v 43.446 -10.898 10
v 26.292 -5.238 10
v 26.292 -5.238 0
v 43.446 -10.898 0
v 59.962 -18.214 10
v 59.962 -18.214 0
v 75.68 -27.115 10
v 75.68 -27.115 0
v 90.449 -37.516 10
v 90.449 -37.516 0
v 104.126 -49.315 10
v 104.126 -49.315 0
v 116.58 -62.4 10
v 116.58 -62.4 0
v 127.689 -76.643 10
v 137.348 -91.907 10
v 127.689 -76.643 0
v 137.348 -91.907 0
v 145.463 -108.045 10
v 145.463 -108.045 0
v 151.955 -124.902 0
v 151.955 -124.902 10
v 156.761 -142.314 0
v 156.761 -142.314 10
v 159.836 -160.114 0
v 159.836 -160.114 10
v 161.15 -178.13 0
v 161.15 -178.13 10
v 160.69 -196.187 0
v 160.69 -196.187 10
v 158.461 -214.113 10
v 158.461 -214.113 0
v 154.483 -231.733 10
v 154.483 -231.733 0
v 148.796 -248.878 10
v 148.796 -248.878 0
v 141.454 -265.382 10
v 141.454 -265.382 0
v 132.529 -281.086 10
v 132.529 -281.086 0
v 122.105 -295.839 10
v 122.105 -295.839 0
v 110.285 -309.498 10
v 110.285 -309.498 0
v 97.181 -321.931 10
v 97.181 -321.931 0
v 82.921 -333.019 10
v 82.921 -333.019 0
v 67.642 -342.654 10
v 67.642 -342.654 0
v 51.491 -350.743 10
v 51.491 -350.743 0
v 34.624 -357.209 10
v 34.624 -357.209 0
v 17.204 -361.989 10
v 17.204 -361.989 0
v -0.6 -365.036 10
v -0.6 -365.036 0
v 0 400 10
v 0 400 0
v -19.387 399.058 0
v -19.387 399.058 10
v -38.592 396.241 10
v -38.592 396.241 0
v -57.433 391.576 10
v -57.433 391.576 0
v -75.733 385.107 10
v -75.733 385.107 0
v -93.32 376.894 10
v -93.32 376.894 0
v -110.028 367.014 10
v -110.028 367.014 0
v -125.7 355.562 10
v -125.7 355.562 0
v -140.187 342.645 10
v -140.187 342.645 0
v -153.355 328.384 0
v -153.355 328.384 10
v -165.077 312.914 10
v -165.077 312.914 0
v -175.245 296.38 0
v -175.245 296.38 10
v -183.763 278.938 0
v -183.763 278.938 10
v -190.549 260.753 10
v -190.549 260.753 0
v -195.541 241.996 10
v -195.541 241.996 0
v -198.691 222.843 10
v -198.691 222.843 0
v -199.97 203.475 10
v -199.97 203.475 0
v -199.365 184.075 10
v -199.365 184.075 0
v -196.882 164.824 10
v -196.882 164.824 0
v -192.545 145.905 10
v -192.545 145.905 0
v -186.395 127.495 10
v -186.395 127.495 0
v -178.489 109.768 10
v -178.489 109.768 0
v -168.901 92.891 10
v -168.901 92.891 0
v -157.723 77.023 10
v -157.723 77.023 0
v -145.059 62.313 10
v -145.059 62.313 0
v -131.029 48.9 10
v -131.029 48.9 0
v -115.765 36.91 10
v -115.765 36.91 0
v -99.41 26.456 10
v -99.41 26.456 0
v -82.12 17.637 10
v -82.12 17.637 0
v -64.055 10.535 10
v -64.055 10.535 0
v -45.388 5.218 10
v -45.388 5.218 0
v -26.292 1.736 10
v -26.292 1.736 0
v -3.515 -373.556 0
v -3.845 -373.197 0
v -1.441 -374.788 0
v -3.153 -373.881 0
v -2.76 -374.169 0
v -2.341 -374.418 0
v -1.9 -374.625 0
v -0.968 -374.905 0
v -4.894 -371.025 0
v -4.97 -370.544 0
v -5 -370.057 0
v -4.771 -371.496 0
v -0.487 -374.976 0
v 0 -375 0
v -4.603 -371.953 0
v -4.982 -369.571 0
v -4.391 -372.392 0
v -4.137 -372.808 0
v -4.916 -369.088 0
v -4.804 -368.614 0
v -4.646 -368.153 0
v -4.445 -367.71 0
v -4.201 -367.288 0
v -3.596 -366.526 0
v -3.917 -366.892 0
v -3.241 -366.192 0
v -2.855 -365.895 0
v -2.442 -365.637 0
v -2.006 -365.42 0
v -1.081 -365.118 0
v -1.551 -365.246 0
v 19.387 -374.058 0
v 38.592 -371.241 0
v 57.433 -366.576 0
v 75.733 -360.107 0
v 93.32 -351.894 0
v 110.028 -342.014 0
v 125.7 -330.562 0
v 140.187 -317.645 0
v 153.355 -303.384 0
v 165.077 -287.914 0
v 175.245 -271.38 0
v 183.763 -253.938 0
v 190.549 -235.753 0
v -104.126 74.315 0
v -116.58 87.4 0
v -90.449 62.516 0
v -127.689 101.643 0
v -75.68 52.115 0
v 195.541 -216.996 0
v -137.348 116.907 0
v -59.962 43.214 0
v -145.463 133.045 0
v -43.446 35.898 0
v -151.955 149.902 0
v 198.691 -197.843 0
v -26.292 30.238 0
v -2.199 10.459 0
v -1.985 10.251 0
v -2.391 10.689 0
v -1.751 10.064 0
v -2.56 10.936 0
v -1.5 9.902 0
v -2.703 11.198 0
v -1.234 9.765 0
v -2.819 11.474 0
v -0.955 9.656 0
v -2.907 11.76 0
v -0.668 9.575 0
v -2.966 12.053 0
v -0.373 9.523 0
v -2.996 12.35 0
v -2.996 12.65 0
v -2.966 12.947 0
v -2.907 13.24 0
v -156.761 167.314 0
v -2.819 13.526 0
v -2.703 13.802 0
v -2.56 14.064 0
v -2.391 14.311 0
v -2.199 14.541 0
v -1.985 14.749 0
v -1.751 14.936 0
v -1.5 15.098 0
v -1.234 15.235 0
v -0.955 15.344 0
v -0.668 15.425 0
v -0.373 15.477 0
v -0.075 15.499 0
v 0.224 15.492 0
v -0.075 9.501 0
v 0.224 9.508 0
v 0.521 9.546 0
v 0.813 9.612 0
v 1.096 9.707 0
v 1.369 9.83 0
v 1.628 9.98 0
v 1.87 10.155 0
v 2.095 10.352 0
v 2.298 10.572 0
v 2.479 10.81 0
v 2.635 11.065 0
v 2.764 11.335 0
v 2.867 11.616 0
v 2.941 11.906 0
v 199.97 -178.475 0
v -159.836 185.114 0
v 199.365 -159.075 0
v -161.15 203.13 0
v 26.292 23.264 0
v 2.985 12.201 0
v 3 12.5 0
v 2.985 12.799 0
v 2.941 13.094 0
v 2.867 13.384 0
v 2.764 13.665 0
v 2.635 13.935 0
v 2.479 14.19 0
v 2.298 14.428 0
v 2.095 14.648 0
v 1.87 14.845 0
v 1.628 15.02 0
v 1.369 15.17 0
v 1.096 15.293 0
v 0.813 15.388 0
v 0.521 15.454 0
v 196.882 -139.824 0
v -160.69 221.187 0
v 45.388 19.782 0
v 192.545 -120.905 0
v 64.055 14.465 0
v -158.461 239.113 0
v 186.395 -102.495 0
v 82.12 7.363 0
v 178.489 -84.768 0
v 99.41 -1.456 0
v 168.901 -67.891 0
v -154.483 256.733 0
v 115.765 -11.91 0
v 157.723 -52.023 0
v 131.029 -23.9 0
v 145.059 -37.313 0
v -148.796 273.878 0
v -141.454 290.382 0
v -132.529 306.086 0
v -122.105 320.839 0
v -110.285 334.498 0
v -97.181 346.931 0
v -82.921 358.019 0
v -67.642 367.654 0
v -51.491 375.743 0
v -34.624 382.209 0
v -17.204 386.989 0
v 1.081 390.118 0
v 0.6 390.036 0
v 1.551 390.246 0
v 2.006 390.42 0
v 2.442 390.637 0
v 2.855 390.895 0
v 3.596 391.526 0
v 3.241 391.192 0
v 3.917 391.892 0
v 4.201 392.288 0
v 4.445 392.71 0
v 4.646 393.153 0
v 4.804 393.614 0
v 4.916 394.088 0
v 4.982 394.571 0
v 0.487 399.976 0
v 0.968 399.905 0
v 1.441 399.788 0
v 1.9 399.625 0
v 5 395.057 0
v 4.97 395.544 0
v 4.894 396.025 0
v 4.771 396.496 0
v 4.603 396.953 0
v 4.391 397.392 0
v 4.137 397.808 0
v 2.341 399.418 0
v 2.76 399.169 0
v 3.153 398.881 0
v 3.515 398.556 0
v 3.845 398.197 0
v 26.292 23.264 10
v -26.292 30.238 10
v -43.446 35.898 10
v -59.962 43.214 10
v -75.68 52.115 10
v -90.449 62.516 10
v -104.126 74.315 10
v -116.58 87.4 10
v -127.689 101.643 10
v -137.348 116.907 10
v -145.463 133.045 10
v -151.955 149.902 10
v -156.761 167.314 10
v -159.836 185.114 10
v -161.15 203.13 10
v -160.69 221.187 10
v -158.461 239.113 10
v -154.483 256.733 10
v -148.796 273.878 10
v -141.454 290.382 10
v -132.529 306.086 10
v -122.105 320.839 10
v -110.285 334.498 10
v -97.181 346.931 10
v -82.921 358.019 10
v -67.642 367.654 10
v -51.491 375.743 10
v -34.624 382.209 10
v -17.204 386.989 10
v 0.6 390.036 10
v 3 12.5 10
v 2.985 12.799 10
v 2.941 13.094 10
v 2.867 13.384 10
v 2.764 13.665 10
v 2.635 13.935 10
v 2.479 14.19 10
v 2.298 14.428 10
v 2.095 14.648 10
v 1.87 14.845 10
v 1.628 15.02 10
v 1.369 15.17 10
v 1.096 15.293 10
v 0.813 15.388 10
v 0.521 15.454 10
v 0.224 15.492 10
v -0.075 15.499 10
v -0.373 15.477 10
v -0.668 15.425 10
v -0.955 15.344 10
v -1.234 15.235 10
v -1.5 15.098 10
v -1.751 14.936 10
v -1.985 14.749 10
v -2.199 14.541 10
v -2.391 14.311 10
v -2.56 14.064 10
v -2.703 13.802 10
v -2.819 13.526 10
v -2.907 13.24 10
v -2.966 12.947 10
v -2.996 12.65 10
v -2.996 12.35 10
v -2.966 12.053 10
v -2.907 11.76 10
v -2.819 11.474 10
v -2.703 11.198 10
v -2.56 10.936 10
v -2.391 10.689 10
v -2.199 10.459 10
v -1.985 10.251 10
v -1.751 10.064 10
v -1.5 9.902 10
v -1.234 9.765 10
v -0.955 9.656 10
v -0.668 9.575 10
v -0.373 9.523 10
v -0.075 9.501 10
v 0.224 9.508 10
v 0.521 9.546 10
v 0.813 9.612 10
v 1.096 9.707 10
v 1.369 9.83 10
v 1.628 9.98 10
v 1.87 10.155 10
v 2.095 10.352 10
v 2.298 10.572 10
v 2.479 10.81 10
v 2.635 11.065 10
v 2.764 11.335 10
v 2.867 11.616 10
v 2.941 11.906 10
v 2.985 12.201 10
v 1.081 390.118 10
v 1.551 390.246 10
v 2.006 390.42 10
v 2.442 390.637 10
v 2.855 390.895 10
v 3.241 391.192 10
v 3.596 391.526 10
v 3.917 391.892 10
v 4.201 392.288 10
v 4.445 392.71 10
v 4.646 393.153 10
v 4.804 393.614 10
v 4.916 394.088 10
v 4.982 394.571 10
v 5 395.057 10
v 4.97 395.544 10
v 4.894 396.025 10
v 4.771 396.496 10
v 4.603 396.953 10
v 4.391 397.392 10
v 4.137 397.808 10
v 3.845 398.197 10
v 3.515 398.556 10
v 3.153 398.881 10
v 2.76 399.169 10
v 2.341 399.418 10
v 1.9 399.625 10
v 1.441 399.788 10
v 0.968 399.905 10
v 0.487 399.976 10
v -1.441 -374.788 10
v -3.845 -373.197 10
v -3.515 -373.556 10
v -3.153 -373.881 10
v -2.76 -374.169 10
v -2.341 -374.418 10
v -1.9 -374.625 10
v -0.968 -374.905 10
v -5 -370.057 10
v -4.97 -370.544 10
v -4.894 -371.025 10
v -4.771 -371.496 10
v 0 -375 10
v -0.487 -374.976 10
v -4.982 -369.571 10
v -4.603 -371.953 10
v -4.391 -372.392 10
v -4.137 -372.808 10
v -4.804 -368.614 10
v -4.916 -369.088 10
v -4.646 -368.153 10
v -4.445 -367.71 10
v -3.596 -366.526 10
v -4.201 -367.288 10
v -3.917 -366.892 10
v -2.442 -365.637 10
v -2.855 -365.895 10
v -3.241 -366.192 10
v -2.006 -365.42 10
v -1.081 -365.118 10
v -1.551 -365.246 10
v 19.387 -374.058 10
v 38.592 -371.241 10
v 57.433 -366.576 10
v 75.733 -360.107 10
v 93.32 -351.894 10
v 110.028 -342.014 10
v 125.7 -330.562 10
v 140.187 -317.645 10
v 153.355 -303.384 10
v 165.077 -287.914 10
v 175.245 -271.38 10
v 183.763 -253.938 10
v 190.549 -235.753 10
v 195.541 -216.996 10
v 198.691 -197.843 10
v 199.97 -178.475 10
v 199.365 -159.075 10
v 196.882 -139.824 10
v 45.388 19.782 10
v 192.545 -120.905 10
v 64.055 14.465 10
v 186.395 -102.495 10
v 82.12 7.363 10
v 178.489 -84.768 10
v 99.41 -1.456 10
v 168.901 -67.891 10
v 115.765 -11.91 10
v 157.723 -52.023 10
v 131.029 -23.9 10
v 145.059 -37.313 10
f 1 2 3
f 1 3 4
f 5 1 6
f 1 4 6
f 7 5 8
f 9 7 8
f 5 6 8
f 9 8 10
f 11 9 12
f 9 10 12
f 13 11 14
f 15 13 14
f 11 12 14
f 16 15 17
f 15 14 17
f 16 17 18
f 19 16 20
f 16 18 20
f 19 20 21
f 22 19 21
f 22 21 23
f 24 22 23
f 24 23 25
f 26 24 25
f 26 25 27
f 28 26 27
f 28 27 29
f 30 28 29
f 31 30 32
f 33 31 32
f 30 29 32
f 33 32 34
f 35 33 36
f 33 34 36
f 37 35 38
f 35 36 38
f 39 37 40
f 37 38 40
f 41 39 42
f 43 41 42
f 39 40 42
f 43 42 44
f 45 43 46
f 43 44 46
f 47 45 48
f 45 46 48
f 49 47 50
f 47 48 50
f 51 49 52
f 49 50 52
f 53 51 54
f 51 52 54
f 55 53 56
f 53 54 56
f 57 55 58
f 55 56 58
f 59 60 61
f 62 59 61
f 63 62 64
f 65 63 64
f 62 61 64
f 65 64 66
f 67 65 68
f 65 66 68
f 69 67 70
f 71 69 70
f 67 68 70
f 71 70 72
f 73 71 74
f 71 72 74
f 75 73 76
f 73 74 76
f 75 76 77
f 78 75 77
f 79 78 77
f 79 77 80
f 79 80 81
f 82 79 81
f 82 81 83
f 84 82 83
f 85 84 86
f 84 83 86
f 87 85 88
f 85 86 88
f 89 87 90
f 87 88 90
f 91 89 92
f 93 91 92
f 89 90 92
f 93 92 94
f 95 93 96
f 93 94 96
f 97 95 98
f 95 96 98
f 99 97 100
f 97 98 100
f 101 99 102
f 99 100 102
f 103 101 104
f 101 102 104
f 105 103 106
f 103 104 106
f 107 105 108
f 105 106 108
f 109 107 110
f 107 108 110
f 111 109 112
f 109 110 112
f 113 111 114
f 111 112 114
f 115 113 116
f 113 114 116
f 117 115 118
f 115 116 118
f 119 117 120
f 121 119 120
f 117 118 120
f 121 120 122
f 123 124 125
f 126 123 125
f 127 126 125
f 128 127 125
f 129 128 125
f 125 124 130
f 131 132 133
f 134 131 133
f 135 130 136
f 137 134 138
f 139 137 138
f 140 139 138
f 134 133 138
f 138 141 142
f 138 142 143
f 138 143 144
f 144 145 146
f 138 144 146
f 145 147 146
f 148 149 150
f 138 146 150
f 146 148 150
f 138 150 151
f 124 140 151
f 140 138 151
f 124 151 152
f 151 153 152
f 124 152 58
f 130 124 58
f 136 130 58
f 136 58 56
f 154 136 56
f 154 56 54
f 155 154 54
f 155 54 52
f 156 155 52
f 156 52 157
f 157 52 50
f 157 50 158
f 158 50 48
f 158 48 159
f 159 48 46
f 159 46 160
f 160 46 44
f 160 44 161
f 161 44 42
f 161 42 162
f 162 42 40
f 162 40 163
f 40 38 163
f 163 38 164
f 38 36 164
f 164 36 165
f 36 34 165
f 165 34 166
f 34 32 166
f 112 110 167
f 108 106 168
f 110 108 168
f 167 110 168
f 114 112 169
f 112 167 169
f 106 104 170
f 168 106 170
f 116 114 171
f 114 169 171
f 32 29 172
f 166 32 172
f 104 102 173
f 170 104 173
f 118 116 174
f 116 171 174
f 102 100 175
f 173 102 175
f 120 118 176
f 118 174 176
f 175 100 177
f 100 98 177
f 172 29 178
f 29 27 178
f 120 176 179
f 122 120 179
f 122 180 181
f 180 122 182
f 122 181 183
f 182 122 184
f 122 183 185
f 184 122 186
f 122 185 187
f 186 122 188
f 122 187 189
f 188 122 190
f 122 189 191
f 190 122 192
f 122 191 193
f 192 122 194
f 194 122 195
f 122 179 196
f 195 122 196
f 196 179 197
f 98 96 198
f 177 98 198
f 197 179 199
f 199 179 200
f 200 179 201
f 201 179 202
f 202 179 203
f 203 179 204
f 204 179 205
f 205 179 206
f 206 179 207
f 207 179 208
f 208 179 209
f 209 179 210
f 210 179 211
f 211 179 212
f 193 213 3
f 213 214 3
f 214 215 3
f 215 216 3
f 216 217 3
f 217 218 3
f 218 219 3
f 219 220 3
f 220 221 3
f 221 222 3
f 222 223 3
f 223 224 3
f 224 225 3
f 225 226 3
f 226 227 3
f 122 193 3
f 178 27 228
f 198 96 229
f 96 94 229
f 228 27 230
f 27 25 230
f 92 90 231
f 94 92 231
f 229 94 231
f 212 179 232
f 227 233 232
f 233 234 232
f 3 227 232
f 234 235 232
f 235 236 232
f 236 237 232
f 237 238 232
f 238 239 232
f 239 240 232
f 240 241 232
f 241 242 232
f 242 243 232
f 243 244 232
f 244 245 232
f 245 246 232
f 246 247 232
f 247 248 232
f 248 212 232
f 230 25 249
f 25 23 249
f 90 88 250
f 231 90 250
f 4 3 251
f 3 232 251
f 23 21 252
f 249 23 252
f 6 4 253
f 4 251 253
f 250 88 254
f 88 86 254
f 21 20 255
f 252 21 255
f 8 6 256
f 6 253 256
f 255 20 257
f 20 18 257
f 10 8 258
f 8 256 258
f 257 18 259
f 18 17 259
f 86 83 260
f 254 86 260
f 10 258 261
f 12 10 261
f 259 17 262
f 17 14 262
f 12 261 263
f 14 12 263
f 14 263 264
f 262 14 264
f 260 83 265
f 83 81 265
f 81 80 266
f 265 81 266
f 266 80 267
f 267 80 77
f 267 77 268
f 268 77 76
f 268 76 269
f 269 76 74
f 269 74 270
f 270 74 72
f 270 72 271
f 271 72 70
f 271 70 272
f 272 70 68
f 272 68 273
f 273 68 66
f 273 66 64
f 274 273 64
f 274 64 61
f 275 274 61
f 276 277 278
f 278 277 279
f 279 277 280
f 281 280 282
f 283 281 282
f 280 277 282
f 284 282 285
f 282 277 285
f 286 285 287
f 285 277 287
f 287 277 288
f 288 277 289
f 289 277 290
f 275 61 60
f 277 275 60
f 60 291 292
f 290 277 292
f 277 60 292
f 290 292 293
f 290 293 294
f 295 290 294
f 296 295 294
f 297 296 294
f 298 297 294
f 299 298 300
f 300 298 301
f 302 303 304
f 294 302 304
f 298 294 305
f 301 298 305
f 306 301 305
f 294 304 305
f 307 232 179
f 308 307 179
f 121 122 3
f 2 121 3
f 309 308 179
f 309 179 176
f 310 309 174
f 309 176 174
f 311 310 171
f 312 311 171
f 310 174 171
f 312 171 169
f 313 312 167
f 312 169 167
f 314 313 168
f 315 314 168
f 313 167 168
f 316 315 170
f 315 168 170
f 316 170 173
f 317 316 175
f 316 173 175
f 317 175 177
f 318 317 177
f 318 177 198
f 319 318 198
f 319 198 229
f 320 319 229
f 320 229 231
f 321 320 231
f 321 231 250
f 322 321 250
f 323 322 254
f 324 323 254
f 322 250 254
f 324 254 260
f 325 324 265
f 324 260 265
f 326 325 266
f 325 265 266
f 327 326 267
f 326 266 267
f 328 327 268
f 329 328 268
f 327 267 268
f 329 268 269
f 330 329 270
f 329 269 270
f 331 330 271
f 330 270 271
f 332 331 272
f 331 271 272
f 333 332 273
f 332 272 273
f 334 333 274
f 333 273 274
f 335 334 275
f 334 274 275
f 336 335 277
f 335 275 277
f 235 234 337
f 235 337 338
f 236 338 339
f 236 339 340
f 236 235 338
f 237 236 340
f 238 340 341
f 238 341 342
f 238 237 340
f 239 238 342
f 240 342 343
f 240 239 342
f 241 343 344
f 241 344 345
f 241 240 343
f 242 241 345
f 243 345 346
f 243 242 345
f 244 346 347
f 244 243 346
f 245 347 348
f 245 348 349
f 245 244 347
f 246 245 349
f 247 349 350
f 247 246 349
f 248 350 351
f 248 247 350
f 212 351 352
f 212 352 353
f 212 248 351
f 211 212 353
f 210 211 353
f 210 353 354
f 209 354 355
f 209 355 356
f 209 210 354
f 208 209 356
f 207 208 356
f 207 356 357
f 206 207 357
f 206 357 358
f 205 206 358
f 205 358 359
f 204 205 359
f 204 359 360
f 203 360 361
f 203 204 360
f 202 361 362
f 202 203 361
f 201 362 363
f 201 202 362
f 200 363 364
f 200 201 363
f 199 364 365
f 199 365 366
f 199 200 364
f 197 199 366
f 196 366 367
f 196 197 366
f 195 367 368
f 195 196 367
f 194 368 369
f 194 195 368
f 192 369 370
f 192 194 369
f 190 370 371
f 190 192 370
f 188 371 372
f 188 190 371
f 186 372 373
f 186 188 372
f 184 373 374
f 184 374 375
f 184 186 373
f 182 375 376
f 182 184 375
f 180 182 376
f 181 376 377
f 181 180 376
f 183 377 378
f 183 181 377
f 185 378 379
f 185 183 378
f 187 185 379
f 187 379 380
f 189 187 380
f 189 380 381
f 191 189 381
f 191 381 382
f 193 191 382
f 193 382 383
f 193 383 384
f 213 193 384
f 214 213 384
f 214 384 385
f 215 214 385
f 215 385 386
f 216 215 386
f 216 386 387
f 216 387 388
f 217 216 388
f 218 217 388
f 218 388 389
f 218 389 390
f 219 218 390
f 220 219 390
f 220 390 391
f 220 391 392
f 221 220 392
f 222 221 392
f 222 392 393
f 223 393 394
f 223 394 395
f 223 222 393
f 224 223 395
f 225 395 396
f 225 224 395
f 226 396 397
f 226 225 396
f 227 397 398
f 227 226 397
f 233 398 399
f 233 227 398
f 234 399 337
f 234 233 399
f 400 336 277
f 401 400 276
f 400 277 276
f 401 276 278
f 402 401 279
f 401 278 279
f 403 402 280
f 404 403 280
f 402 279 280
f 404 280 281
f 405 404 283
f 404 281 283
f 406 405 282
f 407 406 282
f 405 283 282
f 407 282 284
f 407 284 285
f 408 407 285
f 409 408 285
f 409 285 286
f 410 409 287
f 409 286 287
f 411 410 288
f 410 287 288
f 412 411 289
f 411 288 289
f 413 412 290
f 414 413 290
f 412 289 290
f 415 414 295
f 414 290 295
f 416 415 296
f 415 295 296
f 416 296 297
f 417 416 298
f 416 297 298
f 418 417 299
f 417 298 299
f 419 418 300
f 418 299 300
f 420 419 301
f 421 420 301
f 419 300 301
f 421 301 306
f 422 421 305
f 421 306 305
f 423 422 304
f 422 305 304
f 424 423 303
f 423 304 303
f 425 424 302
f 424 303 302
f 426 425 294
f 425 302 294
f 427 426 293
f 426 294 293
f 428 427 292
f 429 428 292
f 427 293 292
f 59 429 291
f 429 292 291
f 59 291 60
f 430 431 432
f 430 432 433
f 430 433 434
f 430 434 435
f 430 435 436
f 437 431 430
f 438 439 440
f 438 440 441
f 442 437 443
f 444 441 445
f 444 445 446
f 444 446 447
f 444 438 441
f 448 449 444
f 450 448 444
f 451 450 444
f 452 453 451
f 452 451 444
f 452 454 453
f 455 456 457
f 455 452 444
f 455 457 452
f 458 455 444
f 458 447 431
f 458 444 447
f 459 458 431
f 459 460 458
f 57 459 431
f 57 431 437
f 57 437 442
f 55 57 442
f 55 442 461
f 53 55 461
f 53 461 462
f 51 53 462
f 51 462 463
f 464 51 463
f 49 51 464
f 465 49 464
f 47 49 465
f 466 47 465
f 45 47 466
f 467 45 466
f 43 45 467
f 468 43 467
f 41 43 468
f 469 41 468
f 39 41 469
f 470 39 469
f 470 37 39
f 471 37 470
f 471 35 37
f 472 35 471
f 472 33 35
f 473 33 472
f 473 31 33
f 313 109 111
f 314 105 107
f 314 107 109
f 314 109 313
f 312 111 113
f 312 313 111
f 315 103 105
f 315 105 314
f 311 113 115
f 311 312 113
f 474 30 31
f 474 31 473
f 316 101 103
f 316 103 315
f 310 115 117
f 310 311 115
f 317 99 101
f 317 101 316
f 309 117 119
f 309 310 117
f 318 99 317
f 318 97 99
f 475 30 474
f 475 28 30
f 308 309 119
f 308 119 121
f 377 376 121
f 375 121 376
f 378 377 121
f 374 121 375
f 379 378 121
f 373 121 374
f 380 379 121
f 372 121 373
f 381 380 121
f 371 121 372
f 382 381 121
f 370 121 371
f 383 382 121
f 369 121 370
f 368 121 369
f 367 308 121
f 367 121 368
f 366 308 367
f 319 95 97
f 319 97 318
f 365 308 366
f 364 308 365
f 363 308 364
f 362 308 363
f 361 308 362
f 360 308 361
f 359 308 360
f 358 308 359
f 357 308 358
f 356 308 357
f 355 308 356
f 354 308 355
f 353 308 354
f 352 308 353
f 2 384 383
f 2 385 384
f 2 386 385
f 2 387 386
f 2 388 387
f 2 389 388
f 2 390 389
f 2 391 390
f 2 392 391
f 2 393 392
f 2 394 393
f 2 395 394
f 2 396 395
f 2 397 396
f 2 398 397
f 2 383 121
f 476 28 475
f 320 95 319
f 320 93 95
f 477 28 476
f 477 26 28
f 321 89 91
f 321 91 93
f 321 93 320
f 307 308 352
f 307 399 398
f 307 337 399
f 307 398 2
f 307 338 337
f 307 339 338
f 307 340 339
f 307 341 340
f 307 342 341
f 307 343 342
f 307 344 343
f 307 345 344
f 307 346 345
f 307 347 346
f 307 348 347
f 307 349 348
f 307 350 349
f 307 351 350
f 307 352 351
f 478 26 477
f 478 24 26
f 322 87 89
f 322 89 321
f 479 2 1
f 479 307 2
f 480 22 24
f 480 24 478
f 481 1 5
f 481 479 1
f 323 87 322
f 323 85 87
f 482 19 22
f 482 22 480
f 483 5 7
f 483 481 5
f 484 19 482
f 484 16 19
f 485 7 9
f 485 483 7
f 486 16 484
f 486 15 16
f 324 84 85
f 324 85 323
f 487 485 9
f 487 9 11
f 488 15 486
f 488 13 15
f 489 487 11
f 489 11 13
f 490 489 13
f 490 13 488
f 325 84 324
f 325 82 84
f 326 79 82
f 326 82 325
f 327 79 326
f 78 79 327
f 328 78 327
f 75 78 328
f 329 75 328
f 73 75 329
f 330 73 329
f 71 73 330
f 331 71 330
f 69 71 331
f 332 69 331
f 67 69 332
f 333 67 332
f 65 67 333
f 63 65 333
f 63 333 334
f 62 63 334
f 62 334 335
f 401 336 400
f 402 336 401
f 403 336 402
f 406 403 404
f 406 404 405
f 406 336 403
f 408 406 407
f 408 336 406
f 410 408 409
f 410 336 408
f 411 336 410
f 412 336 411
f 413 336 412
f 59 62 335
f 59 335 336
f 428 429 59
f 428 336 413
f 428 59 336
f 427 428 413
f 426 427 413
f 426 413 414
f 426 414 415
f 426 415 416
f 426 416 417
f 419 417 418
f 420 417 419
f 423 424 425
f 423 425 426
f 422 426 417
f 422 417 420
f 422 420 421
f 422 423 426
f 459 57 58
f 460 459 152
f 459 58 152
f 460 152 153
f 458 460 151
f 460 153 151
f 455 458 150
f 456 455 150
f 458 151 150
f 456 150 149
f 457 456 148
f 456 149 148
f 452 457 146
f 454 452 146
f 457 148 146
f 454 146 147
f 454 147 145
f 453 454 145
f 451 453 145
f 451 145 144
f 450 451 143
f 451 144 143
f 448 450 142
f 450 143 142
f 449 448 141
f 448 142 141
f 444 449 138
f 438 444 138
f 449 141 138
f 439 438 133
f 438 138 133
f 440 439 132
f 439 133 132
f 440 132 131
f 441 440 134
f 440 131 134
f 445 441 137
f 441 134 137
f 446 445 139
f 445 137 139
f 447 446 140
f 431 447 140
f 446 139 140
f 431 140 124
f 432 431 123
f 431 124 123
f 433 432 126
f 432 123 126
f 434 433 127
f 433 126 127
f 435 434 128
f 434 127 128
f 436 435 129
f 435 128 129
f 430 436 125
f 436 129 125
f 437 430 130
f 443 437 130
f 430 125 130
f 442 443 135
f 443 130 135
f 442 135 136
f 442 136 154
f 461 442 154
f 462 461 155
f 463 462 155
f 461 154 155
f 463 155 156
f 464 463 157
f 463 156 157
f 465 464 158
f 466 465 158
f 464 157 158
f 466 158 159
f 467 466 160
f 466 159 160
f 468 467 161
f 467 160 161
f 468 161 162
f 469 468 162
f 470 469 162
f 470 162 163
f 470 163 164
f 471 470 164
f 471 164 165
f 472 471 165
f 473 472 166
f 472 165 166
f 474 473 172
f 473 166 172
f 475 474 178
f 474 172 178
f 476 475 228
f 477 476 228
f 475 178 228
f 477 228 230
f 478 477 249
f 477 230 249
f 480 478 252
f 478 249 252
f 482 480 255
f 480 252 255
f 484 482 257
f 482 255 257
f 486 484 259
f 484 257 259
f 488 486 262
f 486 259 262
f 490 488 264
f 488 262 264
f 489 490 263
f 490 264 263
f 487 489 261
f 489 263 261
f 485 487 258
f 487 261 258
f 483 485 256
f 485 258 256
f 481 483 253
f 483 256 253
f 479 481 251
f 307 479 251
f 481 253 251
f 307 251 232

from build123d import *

# Parameters (mm, degrees)
F0_R     = 3
F1_DEPTH = 10


with BuildPart() as f1:
    # F0 (on Top) → F1 (new body)
    with BuildSketch(Plane.XY):
        with BuildLine():
            ThreePointArc((0.600467, 390.036187), (4.990945, 395.300778), (0, 400))
            ThreePointArc((0, 400), (-199.565588, 213.17483), (-26.292427, 1.735761))
            Line((-26.292427, 1.735761), (26.292427, -5.237677))
            ThreePointArc((26.292427, -5.237677), (160.690327, -196.187456), (-0.600467, -365.036187))
            ThreePointArc((-0.600467, -365.036187), (-4.990945, -370.300778), (0, -375))
            ThreePointArc((0, -375), (199.565588, -188.17483), (26.292427, 23.264239))
            Line((26.292427, 23.264239), (-26.292427, 30.237677))
            ThreePointArc((-26.292427, 30.237677), (-160.690327, 221.187456), (0.600467, 390.036187))
        make_face()
        with Locations((0, 12.5)):
            Circle(F0_R, mode=Mode.SUBTRACT)
    extrude(amount=F1_DEPTH)


solid = f1.part
